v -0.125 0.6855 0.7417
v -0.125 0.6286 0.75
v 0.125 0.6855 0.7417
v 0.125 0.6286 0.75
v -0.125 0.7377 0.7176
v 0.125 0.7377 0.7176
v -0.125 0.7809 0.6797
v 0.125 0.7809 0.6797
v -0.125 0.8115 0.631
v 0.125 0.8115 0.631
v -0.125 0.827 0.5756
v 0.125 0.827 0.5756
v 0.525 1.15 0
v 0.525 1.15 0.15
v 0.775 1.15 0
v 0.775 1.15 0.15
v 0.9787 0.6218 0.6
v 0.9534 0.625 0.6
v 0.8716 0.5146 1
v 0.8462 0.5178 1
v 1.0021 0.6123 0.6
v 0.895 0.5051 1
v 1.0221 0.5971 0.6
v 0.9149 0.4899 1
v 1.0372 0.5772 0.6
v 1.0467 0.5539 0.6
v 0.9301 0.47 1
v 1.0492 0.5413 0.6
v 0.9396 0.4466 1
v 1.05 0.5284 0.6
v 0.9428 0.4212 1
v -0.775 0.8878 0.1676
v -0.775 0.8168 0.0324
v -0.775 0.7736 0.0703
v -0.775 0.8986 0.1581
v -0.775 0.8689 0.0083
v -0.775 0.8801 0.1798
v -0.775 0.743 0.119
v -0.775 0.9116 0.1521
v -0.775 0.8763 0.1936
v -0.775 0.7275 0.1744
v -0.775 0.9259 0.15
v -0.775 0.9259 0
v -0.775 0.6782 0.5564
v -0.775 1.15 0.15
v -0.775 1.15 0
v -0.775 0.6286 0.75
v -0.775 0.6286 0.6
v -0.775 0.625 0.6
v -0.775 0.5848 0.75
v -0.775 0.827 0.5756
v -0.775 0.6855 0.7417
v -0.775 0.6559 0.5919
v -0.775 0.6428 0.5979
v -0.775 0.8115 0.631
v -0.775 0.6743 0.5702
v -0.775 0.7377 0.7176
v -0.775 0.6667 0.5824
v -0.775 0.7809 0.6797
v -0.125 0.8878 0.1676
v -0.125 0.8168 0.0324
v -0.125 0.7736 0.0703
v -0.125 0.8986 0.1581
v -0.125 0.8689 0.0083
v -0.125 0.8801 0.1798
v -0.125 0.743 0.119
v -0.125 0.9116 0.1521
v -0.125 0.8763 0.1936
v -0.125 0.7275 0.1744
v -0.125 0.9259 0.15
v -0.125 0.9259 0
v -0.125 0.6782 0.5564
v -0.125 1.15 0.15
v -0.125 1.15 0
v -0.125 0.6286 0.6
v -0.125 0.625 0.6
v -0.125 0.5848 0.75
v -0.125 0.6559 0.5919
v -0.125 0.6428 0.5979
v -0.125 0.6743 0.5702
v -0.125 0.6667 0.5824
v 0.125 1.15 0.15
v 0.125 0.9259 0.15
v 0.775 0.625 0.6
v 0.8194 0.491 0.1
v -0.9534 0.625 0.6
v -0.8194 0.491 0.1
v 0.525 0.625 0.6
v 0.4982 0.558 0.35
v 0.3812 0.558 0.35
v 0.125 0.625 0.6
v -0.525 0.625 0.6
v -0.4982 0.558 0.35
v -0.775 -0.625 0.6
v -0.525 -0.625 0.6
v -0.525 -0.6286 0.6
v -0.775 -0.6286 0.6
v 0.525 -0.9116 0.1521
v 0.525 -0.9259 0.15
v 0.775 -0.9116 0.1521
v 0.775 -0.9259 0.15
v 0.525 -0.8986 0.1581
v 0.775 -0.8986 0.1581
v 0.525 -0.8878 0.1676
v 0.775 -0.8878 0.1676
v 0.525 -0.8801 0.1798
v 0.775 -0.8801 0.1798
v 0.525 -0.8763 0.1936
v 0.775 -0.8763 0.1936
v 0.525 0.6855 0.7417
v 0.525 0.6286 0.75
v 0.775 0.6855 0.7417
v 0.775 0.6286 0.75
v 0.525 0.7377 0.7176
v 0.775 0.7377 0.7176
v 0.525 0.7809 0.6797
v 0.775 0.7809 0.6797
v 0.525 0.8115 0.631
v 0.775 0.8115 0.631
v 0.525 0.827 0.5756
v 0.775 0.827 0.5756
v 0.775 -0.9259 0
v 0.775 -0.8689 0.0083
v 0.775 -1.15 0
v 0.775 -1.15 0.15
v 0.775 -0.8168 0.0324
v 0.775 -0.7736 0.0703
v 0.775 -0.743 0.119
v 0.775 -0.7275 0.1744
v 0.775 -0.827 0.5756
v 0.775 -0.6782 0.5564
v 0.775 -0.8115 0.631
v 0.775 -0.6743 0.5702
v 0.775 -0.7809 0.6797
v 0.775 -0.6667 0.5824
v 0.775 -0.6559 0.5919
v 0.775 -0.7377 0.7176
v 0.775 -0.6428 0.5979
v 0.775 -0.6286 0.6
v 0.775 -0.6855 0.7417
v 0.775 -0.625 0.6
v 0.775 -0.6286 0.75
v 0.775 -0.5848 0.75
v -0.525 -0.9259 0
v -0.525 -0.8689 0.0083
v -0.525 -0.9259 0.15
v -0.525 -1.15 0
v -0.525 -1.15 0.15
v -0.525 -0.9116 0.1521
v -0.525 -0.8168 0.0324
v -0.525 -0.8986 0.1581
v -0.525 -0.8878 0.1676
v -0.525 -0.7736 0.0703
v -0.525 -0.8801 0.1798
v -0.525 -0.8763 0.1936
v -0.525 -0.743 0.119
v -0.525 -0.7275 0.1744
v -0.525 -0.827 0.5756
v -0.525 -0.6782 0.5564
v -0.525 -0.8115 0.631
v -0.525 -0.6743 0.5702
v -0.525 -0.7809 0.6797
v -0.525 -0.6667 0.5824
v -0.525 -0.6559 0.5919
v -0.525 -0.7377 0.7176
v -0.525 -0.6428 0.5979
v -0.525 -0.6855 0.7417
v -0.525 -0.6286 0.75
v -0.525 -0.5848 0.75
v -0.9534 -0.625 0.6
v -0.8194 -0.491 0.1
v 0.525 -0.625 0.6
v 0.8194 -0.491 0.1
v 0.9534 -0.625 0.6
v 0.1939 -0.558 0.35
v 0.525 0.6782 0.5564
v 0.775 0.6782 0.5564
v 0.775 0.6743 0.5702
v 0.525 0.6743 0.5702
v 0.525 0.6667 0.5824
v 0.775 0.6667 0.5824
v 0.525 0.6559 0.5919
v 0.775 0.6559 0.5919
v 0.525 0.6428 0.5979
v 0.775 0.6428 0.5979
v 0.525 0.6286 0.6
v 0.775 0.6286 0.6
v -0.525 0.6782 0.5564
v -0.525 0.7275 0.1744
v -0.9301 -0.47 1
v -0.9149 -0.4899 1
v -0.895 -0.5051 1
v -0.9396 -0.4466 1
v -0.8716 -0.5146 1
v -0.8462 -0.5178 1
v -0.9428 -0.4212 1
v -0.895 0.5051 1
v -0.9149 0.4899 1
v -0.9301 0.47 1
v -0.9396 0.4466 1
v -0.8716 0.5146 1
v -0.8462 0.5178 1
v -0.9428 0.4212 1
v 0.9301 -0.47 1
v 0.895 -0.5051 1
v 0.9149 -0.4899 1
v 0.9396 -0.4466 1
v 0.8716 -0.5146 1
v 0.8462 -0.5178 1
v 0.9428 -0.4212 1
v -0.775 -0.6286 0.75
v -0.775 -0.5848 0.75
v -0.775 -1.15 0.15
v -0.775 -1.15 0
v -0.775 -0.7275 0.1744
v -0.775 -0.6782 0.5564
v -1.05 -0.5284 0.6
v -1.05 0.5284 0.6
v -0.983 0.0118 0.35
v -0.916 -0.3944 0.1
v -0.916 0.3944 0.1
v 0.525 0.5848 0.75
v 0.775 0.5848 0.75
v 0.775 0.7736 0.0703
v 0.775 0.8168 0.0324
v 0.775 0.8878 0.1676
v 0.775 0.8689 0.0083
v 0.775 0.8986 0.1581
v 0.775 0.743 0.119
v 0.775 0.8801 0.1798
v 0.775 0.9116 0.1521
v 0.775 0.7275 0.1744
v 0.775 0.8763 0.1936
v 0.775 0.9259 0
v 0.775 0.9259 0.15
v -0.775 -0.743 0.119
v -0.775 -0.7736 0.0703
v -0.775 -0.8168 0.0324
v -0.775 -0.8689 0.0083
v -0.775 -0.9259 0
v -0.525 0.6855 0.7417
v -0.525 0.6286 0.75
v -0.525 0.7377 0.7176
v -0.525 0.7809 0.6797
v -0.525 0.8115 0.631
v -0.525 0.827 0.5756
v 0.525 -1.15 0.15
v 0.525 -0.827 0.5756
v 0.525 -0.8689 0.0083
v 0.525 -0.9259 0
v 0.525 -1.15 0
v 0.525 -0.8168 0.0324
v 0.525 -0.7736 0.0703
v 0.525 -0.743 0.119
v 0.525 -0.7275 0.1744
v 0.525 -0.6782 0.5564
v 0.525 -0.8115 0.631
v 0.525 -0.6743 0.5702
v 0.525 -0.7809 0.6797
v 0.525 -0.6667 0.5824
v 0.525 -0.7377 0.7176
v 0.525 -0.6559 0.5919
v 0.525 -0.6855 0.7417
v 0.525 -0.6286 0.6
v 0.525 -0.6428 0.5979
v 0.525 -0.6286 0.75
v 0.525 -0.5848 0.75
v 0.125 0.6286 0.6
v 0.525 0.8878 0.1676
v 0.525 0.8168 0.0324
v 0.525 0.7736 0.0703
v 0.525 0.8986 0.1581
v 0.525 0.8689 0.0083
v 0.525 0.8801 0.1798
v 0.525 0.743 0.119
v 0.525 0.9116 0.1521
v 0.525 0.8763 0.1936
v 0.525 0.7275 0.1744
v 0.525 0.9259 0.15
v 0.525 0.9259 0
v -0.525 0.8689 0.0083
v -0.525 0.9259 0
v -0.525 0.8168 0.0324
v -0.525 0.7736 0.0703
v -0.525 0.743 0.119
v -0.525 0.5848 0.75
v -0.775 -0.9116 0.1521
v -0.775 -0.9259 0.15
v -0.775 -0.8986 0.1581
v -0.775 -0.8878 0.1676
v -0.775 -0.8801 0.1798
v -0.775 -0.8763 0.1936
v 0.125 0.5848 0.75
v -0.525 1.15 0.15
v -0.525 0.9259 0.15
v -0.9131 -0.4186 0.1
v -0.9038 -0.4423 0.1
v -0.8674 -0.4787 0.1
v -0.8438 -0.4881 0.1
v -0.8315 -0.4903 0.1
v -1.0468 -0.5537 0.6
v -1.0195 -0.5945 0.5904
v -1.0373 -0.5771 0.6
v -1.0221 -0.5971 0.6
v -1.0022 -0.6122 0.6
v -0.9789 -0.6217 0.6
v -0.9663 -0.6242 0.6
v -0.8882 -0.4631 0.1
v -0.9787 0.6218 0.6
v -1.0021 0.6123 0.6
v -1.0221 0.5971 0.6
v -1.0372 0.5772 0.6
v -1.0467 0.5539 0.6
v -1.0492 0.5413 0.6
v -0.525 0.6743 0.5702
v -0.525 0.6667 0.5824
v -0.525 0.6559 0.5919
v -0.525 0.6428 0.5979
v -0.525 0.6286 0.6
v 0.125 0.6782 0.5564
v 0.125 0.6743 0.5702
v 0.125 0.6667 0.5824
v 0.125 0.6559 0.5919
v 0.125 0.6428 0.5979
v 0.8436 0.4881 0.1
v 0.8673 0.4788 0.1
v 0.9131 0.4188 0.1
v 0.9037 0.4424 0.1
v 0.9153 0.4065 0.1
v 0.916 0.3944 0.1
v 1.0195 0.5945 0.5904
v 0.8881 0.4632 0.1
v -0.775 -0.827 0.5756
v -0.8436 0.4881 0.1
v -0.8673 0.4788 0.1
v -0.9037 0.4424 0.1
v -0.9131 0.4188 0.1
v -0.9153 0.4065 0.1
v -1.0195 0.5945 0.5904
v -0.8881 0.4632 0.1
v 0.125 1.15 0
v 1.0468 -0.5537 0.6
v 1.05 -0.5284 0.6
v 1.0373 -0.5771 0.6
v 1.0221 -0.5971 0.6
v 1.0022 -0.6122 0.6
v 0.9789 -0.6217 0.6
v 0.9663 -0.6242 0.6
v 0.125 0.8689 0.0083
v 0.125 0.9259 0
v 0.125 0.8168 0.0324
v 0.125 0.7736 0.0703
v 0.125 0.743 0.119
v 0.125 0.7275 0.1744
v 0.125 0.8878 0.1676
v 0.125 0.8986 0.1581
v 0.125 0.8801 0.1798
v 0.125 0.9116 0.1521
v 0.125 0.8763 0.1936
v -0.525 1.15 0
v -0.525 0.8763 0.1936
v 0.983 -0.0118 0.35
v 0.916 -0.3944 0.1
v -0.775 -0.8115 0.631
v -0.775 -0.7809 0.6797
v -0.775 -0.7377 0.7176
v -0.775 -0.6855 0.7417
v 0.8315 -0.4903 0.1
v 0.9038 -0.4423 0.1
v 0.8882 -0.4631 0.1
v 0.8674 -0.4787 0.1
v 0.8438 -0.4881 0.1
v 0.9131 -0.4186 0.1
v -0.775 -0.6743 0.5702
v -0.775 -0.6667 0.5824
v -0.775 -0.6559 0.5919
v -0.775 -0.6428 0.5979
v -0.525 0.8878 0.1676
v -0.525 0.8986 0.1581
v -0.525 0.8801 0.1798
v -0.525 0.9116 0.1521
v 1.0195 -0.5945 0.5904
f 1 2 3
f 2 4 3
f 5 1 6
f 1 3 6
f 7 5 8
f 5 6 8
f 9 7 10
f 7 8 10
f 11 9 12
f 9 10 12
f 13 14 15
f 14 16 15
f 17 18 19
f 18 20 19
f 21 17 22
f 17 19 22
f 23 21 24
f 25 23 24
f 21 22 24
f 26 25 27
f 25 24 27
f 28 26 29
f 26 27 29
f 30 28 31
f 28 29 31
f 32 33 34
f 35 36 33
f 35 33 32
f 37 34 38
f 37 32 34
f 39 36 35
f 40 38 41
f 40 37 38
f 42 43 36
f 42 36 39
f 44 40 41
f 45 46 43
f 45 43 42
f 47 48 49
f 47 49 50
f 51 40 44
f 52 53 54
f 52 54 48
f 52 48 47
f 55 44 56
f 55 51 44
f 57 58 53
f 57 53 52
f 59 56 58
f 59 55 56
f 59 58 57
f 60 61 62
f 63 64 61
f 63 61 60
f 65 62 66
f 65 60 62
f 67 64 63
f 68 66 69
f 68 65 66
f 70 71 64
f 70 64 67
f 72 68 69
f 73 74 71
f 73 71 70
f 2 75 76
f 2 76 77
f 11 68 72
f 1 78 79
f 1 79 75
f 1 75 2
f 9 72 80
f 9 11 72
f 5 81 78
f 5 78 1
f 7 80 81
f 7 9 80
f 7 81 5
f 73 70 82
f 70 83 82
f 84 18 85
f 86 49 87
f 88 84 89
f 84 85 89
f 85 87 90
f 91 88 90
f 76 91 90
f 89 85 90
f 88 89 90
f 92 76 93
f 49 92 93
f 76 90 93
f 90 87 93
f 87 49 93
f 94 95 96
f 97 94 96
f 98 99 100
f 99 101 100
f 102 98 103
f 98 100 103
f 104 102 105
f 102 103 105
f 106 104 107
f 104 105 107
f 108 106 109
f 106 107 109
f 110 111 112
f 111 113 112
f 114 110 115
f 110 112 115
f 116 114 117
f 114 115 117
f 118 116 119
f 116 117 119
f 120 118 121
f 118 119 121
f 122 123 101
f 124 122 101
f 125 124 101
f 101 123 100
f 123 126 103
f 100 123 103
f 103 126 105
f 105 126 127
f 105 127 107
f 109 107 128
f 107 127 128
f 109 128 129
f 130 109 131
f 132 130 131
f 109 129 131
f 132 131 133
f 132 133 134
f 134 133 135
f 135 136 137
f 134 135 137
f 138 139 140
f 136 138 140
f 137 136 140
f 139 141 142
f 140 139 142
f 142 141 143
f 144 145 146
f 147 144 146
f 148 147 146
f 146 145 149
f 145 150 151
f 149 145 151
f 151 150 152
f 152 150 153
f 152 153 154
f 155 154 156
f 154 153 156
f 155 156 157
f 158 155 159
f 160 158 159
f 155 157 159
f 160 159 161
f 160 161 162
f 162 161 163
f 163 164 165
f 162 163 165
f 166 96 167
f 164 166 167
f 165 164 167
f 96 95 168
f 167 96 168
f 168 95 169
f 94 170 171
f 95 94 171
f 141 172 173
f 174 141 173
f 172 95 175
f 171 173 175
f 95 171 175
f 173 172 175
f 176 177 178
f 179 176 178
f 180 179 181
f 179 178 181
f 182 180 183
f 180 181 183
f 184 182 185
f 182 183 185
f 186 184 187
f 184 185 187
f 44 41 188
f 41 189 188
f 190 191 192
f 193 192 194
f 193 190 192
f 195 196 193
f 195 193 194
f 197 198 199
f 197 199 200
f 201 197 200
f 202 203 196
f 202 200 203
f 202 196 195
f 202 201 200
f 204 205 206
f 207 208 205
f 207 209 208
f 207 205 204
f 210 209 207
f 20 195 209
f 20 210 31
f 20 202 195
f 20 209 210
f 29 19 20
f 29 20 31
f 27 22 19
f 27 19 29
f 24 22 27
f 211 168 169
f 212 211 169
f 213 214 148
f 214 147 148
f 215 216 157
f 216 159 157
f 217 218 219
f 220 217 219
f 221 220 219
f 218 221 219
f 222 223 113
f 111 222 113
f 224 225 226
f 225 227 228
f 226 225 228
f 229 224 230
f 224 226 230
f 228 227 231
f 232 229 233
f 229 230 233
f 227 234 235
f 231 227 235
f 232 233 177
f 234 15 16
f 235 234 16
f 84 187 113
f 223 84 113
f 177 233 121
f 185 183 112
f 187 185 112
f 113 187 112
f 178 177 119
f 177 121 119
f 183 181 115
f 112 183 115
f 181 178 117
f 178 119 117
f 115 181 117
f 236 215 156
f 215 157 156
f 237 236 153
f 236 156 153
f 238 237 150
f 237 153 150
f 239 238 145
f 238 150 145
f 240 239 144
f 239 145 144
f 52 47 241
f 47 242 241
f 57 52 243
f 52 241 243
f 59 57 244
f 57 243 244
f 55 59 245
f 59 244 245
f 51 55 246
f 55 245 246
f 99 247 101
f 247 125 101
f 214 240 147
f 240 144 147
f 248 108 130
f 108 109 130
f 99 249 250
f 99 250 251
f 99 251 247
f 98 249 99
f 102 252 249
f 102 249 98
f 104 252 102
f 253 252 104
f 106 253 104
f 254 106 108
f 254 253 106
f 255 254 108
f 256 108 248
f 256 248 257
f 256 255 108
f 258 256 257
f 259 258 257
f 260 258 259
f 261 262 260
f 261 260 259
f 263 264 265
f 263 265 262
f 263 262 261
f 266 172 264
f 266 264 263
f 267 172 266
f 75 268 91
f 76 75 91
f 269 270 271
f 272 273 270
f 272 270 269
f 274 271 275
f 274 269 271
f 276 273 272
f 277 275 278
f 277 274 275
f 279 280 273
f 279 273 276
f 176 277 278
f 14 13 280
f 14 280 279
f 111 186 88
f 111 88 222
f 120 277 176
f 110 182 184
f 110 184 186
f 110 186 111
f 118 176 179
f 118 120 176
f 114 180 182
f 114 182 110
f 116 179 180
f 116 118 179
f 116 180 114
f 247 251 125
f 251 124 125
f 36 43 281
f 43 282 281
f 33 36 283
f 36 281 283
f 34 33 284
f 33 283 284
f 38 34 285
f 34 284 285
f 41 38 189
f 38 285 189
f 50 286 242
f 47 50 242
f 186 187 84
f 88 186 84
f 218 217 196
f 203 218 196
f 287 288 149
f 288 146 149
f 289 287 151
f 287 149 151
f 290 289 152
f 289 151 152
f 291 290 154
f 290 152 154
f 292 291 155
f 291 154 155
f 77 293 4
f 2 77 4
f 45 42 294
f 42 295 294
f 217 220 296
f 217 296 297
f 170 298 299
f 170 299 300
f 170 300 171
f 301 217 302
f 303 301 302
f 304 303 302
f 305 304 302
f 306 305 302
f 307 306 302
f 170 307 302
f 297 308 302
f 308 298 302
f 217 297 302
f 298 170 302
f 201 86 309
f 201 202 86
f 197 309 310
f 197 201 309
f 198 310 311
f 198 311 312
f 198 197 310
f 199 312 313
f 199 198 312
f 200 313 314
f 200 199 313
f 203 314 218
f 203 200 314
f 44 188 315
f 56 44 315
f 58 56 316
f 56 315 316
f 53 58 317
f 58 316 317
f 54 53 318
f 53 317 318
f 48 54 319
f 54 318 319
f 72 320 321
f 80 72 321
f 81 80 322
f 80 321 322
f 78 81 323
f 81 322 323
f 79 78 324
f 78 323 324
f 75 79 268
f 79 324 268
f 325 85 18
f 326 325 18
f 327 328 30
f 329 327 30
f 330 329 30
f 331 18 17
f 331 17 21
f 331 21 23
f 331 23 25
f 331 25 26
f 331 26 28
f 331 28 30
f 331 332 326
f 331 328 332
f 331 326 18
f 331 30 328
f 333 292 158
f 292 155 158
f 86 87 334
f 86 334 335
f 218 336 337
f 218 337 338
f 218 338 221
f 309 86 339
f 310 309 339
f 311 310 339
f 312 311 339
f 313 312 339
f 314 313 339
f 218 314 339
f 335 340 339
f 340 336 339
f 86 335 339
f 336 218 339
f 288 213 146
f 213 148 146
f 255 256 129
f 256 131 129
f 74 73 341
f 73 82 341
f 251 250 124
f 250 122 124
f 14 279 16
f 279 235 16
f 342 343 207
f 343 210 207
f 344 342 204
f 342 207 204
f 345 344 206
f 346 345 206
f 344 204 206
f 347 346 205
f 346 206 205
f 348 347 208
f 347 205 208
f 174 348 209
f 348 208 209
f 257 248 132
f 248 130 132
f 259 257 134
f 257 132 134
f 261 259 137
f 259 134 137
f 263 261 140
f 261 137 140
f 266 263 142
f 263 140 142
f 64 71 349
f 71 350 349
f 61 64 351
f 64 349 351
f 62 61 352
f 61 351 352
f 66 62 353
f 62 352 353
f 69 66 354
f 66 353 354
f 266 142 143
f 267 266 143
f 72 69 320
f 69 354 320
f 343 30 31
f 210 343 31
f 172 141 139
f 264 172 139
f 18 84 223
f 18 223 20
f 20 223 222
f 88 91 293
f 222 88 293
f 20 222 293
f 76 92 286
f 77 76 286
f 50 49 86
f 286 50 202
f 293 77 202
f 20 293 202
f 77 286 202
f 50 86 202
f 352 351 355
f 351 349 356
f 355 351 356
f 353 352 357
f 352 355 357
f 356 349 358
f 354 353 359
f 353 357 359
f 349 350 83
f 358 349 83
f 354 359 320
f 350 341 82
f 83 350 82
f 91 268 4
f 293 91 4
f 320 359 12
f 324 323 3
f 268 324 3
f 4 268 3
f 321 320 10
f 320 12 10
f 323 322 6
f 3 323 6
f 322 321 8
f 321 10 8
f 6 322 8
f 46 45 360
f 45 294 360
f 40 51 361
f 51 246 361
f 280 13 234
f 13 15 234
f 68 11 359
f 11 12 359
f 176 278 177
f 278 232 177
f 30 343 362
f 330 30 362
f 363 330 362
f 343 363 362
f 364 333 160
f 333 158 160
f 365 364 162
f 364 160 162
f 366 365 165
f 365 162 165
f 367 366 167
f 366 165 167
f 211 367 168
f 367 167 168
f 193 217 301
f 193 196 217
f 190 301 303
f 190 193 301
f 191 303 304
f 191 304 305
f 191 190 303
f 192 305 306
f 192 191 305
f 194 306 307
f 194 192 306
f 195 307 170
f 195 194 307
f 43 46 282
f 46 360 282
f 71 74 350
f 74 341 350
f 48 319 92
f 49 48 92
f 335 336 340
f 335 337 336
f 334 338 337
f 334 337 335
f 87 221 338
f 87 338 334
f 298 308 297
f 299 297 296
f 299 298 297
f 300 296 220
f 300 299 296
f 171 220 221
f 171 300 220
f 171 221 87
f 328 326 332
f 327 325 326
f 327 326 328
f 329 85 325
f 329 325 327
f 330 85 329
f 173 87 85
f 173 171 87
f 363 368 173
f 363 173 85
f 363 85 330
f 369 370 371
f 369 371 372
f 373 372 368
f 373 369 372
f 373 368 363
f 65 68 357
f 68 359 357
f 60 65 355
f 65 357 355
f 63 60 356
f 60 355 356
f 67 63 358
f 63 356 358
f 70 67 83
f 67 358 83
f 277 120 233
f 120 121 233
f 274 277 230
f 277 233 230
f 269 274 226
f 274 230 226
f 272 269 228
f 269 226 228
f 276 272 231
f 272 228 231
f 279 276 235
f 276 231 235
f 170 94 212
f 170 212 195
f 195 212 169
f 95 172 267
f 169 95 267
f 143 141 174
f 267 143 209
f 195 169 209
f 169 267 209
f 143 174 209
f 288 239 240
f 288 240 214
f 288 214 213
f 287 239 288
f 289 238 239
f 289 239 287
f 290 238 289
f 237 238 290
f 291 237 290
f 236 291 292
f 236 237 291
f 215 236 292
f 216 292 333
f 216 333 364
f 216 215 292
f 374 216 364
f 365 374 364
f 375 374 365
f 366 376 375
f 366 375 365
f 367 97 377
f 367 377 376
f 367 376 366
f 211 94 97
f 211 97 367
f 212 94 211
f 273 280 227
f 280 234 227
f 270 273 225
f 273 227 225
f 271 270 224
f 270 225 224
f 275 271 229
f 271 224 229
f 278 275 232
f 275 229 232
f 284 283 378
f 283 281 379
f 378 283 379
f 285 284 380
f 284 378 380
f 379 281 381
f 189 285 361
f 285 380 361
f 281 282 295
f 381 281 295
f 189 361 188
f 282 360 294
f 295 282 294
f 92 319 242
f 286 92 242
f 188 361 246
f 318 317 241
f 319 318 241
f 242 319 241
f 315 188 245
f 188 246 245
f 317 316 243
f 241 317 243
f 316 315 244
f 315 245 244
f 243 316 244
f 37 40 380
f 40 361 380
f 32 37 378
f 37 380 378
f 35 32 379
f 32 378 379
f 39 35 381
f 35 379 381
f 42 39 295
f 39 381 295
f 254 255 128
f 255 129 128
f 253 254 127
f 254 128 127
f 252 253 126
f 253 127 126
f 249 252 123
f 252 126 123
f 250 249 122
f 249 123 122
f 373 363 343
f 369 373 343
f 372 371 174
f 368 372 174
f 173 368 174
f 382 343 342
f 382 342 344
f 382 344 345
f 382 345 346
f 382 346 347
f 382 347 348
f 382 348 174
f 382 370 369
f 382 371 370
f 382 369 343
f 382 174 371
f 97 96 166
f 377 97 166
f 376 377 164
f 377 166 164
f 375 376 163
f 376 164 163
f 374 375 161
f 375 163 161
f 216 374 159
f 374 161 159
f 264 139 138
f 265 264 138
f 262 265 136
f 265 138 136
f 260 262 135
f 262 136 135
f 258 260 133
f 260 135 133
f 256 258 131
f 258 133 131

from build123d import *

# Parameters (mm, degrees)
EXTRUDE_START             = 0.6
SKETCH_1_W                = 2.1
SKETCH_1_H                = 1.25
EXTRUDE_1_DEPTH           = 0.4
EXTRUDE_1_TAPER           = 15
EXTRUDE_1_OTHER_WAY_DEPTH = 0.5
EXTRUDE_1_OTHER_WAY_TAPER = 15
EXTRUDE_START_2           = 0.65
EXTRUDE_4_DEPTH           = 0.125
EXTRUDE_5_DEPTH           = 0.125
PATTERN_LINEAR_2_COUNT    = 2
PATTERN_LINEAR_2_PITCH    = 1.3
PATTERN_LINEAR_3_COUNT    = 3
PATTERN_LINEAR_3_PITCH    = 0.65
FILLET_3_R                = 0.1


with BuildPart() as part:
    # Эскиз1 → Вытянуть1 (new body)
    with BuildSketch(Plane.XY.offset(EXTRUDE_START)):
        Rectangle(SKETCH_1_W, SKETCH_1_H)
    extrude(amount=EXTRUDE_1_DEPTH, taper=EXTRUDE_1_TAPER)

    # Эскиз1 → Вытянуть1 other way (add)
    with BuildSketch(Plane.XY.offset(EXTRUDE_START)):
        Rectangle(SKETCH_1_W, SKETCH_1_H)
    extrude(amount=-EXTRUDE_1_OTHER_WAY_DEPTH, taper=EXTRUDE_1_OTHER_WAY_TAPER)

    # Эскиз2 → Вытянуть4 (add, symmetric)
    with BuildSketch(Plane(origin=(0, 0, 0), x_dir=(0, 0, -1), z_dir=(1, 0, 0)).offset(EXTRUDE_START_2)):
        with BuildLine():
            Line((-0.6, 0.55), (-0.75, 0.55))
            Line((-0.75, 0.55), (-0.75, 0.628617172))
            ThreePointArc((-0.75, 0.628617172), (-0.700198025, 0.760679859), (-0.575594468, 0.82697272))
            Line((-0.575594468, 0.82697272), (-0.193601383, 0.876262542))
            ThreePointArc((-0.193601383, 0.876262542), (-0.162450494, 0.892835757), (-0.15, 0.925851429))
            Line((-0.15, 0.925851429), (-0.15, 1.15))
            Line((-0.15, 1.15), (0, 1.15))
            Line((0, 1.15), (0, 0.925851429))
            ThreePointArc((0, 0.925851429), (-0.049801975, 0.793788742), (-0.174405532, 0.727495881))
            Line((-0.174405532, 0.727495881), (-0.556398617, 0.678206059))
            ThreePointArc((-0.556398617, 0.678206059), (-0.587549506, 0.661632844), (-0.6, 0.628617172))
            Line((-0.6, 0.628617172), (-0.6, 0.55))
        make_face()
    extrude_4 = extrude(amount=EXTRUDE_4_DEPTH, both=True)

    # Эскиз2<4> → Вытянуть5 (add, symmetric)
    with BuildSketch(Plane(origin=(0, 0, 0), x_dir=(0, 0, -1), z_dir=(1, 0, 0)).offset(EXTRUDE_START_2)):
        with BuildLine():
            ThreePointArc((-0.6, -0.628617172), (-0.587549506, -0.661632844), (-0.556398617, -0.678206059))
            Line((-0.556398617, -0.678206059), (-0.174405532, -0.727495881))
            ThreePointArc((-0.174405532, -0.727495881), (-0.049801975, -0.793788742), (0, -0.925851429))
            Line((0, -0.925851429), (0, -1.15))
            Line((0, -1.15), (-0.15, -1.15))
            Line((-0.15, -1.15), (-0.15, -0.925851429))
            ThreePointArc((-0.15, -0.925851429), (-0.162450494, -0.892835757), (-0.193601383, -0.876262542))
            Line((-0.193601383, -0.876262542), (-0.575594468, -0.82697272))
            ThreePointArc((-0.575594468, -0.82697272), (-0.700198025, -0.760679859), (-0.75, -0.628617172))
            Line((-0.75, -0.628617172), (-0.75, -0.55))
            Line((-0.75, -0.55), (-0.6, -0.55))
            Line((-0.6, -0.55), (-0.6, -0.628617172))
        make_face()
    extrude_5 = extrude(amount=EXTRUDE_5_DEPTH, both=True)

    # Линейный массив2: Вытянуть5 ×2
    with Locations(*[(-i * PATTERN_LINEAR_2_PITCH, 0, 0) for i in range(1, PATTERN_LINEAR_2_COUNT)]):
        add(extrude_5)

    # Линейный массив3: Вытянуть4 ×3
    with Locations(*[(-i * PATTERN_LINEAR_3_PITCH, 0, 0) for i in range(1, PATTERN_LINEAR_3_COUNT)]):
        add(extrude_4)

    # Скругление3
    fillet_3_edges = [part.edges().sort_by_distance(p)[0] for p in [
        (0.996410162, -0.571410162, 0.8),
        (0.996410162, 0.571410162, 0.8),
        (-0.996410162, 0.571410162, 0.8),
        (-0.996410162, -0.571410162, 0.8),
        (0.983012702, -0.558012702, 0.35),
        (-0.983012702, -0.558012702, 0.35),
        (-0.983012702, 0.558012702, 0.35),
        (0.983012702, 0.558012702, 0.35),
    ]]
    fillet(fillet_3_edges, radius=FILLET_3_R)


solid = part.part
